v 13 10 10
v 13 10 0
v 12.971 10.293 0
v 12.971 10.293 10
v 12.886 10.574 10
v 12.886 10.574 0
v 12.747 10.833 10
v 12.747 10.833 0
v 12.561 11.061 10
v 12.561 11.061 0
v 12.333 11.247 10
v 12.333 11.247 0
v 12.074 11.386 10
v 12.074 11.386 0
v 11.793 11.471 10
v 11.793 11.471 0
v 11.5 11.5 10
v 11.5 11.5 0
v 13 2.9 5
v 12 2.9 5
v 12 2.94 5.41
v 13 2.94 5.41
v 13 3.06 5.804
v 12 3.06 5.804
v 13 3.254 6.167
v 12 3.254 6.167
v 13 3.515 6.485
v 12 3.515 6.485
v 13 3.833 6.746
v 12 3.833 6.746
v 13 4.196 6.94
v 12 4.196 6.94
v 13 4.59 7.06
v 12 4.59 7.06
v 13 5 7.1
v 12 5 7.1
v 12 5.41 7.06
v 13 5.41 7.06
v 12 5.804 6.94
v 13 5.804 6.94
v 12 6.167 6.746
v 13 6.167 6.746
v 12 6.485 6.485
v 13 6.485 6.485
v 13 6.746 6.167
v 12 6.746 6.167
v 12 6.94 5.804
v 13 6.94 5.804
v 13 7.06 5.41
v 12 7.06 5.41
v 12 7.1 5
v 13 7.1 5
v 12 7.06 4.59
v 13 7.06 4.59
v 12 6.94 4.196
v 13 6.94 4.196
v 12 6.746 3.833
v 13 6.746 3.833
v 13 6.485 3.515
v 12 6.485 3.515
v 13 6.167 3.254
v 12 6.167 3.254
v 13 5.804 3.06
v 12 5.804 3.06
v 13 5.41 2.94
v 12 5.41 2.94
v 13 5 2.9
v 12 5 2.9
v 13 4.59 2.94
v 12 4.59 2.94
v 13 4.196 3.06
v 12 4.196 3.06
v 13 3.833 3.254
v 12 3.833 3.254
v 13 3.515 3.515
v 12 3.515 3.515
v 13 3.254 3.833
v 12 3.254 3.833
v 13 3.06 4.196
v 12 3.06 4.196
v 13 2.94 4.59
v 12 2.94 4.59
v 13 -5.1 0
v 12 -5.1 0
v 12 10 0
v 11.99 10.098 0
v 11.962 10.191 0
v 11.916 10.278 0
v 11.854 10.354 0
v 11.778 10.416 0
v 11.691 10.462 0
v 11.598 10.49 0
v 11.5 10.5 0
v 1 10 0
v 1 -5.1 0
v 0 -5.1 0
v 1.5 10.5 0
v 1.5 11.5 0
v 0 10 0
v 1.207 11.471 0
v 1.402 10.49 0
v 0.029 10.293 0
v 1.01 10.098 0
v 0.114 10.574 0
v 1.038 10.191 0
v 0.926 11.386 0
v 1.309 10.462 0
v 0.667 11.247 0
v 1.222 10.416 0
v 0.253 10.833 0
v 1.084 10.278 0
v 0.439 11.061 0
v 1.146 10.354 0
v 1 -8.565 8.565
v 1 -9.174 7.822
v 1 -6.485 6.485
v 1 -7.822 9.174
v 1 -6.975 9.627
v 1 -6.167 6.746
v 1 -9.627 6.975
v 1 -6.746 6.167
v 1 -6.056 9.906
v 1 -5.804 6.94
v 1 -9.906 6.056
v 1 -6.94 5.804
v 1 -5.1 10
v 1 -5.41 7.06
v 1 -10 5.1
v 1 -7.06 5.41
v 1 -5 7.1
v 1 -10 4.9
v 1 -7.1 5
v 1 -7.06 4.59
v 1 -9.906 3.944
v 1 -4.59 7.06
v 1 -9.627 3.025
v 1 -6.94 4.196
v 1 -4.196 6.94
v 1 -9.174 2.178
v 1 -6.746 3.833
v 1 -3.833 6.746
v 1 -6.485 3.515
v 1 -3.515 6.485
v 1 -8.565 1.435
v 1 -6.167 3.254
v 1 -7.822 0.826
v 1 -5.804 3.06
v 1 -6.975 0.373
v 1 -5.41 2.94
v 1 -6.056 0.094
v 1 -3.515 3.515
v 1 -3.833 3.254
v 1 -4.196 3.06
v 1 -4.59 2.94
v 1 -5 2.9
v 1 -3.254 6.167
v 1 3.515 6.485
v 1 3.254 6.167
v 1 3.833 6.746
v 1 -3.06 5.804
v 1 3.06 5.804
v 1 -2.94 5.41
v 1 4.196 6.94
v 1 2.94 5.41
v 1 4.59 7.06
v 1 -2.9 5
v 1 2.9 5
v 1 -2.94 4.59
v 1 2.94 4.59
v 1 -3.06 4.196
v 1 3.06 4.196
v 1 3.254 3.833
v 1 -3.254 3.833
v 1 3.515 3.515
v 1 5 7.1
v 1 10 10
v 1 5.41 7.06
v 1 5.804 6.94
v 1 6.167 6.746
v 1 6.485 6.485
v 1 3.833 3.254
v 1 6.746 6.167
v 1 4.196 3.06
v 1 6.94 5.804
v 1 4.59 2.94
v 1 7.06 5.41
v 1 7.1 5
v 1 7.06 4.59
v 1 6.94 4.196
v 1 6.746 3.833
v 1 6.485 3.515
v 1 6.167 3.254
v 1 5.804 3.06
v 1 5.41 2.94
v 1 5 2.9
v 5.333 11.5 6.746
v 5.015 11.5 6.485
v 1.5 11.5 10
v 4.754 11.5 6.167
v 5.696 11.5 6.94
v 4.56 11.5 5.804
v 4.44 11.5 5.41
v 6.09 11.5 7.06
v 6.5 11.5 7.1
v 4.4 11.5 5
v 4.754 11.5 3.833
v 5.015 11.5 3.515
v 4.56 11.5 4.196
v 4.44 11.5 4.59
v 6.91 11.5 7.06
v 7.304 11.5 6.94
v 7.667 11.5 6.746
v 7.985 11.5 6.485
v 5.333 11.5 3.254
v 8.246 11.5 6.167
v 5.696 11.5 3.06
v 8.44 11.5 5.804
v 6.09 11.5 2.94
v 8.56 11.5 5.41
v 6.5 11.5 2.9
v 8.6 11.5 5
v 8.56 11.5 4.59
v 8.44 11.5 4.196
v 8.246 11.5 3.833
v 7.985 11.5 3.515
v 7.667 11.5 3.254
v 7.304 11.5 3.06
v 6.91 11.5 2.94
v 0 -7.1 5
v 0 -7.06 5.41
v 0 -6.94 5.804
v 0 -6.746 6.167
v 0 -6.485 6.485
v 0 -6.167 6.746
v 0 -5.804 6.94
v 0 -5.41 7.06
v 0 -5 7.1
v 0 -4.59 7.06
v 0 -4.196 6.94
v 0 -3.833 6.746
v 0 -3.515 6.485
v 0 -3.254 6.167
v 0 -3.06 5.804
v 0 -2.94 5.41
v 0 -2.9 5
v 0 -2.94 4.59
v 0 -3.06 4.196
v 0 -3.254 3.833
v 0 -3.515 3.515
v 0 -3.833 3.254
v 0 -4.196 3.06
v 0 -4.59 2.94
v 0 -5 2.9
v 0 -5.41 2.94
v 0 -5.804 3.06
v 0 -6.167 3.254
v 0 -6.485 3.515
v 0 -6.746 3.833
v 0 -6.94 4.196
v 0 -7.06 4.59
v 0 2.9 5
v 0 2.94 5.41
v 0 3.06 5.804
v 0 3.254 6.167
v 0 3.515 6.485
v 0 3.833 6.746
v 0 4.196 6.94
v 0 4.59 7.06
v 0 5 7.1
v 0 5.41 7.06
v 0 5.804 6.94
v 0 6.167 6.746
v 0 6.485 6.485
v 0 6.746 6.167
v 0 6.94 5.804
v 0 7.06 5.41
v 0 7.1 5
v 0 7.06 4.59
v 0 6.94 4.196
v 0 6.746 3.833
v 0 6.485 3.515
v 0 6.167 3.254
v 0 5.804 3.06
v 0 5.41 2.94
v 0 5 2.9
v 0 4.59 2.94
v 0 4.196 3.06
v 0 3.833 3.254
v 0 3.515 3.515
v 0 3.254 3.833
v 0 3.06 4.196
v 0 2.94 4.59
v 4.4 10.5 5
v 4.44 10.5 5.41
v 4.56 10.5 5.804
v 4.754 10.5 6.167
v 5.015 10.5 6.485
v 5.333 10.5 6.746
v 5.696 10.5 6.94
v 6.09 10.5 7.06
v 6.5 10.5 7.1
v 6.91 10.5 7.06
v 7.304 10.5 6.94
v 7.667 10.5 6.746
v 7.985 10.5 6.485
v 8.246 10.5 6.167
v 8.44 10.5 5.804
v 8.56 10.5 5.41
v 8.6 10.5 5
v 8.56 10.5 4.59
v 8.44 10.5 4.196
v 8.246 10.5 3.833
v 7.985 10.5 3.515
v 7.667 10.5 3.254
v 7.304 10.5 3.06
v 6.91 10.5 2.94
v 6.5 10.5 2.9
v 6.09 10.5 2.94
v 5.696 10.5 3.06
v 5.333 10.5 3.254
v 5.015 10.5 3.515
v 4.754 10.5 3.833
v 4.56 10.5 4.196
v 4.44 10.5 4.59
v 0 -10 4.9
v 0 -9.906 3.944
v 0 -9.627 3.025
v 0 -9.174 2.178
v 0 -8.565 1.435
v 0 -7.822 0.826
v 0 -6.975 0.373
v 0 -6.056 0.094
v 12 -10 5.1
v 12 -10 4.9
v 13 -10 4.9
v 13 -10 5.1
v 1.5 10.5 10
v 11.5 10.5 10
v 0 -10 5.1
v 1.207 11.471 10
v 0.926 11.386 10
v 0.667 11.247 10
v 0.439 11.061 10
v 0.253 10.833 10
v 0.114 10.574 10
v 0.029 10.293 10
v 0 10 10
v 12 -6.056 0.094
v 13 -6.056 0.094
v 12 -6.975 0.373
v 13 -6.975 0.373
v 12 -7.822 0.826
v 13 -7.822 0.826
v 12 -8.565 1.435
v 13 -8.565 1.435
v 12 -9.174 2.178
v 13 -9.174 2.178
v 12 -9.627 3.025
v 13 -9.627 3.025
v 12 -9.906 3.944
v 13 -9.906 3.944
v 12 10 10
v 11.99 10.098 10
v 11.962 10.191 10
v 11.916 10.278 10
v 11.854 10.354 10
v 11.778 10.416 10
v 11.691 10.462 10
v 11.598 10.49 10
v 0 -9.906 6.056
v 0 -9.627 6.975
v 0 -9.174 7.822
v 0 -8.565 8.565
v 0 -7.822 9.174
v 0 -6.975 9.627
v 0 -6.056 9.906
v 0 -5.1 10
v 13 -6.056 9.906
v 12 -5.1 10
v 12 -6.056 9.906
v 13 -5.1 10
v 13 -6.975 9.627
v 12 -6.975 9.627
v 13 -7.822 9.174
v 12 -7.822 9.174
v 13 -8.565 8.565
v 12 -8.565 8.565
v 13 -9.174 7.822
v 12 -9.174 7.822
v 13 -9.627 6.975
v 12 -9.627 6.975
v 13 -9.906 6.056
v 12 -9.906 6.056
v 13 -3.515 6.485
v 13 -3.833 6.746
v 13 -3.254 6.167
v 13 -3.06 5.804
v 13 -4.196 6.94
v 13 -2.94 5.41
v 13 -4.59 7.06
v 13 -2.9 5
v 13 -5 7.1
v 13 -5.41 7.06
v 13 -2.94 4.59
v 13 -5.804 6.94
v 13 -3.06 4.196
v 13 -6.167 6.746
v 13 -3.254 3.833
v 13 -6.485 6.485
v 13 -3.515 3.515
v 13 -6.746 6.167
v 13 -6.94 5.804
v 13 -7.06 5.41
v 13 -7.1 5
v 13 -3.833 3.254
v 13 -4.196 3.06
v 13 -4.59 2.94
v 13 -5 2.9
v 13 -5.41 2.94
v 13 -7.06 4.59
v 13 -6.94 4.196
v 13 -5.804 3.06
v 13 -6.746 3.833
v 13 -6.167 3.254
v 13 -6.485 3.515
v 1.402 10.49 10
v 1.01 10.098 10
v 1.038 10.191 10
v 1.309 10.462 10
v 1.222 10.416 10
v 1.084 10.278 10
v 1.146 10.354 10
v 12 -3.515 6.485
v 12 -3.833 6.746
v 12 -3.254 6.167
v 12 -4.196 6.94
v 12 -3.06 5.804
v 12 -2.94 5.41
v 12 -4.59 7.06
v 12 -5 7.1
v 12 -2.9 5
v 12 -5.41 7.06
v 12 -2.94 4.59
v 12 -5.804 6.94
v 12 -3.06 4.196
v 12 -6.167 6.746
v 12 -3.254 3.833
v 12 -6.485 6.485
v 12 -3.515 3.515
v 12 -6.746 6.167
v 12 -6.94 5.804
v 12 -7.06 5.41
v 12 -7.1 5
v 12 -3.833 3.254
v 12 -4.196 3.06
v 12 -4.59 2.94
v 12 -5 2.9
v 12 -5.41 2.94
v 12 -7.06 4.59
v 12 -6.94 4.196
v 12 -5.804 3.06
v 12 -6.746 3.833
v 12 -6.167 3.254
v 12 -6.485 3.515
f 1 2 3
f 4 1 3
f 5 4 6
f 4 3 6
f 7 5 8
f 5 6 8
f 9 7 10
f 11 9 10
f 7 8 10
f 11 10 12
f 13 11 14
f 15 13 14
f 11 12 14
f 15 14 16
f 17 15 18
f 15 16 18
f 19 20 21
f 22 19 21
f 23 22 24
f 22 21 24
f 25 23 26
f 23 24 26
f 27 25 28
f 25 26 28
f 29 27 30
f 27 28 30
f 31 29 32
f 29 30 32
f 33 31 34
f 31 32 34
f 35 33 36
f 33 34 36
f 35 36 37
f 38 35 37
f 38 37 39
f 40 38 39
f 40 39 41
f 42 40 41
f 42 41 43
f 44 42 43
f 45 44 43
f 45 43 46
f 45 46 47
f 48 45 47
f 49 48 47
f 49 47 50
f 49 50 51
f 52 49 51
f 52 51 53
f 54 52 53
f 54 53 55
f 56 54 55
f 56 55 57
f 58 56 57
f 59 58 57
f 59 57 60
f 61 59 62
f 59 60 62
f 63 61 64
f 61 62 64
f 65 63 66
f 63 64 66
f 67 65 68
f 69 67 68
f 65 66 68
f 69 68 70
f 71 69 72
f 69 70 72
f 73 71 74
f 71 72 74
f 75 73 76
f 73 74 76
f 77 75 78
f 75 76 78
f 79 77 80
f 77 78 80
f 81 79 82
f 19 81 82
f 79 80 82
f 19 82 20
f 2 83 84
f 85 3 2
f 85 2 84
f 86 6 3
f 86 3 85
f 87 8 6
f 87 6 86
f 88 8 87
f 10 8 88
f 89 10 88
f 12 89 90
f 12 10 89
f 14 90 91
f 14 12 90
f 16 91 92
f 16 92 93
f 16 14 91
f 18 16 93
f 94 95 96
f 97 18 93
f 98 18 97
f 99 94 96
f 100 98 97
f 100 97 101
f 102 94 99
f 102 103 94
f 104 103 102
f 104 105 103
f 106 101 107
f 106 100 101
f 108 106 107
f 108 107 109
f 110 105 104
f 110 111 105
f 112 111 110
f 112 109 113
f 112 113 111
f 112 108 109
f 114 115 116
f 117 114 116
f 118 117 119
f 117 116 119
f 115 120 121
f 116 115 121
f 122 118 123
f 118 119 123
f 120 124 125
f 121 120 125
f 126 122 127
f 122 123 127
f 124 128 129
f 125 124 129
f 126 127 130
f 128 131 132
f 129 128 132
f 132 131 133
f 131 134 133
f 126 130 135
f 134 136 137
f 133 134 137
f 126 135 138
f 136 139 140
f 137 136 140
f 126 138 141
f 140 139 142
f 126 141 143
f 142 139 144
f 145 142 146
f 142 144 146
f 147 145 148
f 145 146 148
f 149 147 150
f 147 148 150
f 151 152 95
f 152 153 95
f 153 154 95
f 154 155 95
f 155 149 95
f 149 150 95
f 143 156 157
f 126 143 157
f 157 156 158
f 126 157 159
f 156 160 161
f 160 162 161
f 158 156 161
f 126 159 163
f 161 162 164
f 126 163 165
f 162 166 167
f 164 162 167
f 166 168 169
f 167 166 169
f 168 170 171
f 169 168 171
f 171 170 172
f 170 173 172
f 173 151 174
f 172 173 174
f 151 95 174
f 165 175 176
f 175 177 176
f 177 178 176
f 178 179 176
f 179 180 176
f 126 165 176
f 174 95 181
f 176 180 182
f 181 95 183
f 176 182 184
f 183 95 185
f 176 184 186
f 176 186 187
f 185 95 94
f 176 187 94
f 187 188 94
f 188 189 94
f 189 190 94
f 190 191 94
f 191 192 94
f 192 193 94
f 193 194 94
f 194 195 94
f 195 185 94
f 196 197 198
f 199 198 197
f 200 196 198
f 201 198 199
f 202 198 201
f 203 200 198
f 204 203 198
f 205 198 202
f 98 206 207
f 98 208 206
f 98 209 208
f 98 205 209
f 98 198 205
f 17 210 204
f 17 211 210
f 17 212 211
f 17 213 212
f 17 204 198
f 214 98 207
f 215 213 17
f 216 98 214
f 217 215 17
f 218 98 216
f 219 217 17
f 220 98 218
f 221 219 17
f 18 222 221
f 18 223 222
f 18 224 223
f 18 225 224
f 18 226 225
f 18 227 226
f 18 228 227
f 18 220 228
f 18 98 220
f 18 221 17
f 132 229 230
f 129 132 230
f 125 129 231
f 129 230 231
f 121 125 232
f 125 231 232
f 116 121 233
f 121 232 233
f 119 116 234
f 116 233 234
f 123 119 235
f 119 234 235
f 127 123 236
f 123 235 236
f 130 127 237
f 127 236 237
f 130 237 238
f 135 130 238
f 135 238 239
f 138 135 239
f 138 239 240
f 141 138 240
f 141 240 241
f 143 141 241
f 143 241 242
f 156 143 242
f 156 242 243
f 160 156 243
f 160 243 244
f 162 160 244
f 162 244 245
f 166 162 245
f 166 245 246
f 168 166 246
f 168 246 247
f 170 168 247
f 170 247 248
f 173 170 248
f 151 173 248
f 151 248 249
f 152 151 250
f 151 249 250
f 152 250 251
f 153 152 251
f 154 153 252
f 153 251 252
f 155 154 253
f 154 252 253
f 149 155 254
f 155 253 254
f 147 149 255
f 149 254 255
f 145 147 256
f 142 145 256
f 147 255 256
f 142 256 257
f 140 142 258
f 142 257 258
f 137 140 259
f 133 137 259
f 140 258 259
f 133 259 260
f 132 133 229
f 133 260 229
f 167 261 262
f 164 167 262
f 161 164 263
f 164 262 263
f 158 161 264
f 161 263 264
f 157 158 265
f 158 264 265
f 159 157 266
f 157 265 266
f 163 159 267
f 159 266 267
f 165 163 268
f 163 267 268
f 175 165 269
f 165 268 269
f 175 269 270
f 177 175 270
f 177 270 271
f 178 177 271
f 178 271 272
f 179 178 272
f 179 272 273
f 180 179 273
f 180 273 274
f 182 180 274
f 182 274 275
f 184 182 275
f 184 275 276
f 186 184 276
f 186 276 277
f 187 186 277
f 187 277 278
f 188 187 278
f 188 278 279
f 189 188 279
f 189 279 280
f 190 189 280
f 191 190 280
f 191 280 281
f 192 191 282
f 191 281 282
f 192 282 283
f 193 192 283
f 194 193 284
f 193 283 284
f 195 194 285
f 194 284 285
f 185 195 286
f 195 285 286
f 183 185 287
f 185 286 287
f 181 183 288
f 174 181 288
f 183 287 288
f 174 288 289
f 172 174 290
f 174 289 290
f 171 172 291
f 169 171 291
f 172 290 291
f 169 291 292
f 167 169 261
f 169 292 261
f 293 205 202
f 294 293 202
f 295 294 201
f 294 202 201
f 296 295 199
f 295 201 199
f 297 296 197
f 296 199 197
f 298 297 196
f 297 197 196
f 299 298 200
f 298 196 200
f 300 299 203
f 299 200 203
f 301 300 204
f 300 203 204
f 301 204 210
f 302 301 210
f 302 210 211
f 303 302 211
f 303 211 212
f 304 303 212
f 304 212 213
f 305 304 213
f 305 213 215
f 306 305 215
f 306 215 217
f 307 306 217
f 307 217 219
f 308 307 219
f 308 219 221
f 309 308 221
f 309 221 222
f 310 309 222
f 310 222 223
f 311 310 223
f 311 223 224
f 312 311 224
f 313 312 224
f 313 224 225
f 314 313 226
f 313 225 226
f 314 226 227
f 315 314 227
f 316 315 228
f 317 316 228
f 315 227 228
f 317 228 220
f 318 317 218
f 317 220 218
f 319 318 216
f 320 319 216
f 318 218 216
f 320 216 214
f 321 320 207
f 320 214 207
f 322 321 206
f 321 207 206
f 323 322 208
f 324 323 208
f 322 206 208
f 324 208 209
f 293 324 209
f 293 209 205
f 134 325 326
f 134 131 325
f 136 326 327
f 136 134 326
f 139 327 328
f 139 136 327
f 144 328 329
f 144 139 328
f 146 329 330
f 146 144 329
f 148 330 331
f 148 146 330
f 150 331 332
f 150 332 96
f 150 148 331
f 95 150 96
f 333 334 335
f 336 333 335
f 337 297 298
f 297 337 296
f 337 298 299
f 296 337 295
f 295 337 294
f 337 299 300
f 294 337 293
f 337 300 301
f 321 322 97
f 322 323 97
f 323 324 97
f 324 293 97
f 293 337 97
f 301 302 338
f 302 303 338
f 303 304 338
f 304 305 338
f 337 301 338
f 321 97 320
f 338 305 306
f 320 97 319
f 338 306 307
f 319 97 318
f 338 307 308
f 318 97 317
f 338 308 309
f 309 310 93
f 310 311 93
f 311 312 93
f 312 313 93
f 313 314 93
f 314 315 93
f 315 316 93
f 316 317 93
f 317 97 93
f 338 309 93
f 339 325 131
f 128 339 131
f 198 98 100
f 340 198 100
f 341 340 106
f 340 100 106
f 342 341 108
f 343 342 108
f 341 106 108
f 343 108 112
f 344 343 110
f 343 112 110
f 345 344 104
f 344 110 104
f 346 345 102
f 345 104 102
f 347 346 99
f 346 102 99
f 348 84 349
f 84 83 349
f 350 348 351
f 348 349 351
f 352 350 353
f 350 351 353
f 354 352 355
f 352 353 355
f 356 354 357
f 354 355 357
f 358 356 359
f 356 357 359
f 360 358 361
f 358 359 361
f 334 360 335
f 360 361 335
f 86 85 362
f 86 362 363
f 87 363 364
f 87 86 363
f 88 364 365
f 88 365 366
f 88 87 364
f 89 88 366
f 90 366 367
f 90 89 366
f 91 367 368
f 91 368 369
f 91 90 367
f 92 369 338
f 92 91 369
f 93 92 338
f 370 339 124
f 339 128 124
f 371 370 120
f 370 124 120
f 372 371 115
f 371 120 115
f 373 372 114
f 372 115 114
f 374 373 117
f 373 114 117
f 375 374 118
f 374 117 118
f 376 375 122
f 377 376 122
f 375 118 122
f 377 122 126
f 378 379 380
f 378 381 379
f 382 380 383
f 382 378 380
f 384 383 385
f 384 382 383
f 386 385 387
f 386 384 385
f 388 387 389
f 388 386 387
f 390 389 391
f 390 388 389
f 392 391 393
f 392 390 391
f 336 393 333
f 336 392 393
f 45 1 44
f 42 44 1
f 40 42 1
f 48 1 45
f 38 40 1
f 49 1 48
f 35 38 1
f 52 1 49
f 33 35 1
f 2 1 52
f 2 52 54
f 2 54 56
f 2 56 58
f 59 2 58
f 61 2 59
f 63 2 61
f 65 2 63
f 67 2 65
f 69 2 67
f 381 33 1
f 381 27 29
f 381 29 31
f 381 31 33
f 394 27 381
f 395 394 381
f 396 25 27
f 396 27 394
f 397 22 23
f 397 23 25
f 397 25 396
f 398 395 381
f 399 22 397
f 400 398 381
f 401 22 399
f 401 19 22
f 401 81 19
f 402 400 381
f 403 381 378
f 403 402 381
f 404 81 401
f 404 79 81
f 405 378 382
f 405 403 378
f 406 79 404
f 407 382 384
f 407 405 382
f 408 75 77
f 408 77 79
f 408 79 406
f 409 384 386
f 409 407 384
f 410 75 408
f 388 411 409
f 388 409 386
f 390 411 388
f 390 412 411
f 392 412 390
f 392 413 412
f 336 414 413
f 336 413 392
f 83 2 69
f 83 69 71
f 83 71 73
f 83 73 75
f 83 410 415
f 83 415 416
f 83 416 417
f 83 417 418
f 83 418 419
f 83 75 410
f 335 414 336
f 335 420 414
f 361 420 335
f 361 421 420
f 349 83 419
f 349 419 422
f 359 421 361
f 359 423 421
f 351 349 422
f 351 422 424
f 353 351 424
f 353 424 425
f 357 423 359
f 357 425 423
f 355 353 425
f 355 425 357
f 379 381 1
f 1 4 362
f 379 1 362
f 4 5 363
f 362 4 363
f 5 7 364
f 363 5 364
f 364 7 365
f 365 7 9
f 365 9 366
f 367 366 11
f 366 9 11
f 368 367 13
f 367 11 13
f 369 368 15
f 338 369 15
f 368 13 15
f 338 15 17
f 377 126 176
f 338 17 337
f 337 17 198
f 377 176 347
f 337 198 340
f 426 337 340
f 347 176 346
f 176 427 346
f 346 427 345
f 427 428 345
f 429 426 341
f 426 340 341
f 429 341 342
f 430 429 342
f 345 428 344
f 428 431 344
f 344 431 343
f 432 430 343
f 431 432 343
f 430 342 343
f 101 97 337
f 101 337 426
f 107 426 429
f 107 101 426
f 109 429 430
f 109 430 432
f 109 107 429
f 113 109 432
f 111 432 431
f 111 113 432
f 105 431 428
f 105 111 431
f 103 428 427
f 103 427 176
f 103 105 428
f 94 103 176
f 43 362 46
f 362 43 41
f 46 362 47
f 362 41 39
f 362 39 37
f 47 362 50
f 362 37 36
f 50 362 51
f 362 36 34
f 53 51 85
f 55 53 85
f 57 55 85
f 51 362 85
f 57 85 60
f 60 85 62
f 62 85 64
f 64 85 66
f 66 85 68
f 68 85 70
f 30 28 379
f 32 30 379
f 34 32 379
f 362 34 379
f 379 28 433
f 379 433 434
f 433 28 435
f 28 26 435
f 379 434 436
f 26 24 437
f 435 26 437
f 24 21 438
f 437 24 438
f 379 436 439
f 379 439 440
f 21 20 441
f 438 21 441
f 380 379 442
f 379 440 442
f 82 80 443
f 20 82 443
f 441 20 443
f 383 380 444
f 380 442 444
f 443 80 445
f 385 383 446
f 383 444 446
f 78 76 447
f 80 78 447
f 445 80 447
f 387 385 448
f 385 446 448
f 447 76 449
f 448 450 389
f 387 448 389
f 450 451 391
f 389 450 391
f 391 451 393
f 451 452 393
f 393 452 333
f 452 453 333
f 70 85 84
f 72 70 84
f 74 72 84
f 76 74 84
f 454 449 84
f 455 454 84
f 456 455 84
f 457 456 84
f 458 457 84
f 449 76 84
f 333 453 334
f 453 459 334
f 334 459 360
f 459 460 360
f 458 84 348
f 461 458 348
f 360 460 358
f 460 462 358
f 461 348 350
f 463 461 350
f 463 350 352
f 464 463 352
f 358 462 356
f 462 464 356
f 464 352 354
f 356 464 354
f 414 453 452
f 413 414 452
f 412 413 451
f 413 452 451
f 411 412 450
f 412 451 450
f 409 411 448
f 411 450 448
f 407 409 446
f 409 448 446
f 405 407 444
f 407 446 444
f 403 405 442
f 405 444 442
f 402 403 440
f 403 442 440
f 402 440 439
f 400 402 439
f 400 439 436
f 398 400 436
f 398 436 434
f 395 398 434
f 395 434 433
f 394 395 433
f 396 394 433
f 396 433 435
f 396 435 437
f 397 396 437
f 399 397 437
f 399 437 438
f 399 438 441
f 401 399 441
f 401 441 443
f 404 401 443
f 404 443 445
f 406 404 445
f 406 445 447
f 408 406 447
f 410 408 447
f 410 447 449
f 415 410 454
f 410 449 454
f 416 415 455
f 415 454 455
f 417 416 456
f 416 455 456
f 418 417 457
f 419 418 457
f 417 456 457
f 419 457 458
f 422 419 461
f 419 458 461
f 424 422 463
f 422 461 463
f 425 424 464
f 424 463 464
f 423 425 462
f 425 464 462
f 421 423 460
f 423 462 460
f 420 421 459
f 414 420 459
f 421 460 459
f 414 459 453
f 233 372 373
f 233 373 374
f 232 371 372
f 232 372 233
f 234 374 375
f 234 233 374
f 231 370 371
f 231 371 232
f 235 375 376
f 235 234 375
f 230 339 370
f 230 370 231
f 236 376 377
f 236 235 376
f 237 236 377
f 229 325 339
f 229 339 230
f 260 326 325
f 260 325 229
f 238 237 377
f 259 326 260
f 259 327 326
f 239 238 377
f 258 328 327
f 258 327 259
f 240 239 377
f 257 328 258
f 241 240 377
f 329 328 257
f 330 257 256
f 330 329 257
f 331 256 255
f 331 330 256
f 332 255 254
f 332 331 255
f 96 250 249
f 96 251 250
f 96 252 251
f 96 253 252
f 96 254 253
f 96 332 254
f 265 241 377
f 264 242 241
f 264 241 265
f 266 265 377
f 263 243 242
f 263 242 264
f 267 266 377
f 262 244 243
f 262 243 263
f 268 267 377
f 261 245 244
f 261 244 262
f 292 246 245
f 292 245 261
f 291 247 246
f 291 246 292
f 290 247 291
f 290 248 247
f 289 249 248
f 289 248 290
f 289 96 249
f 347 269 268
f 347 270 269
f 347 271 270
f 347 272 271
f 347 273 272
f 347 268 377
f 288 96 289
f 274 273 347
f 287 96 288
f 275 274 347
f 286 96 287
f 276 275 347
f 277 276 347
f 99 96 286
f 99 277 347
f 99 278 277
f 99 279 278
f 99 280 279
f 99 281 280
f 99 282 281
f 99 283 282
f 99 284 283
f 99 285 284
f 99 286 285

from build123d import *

# Parameters (mm, degrees)
PAD_DEPTH       = 10
SKETCH002_R     = 2.1
POCKET_DEPTH    = 5
SKETCH001_R     = 2.1
POCKET001_DEPTH = 13.001
FILLET_R        = 4.9


with BuildPart() as part:
    # Sketch → Pad (new body)
    with BuildSketch(Plane.XY):
        with BuildLine():
            Line((0, -10), (0, 10))
            ThreePointArc((1.5, 11.5), (0.43934, 11.06066), (0, 10))
            Line((1.5, 11.5), (11.5, 11.5))
            ThreePointArc((13, 10), (12.56066, 11.06066), (11.5, 11.5))
            Line((13, 10), (13, -9.999991))
            Line((12, -9.999991), (13, -9.999991))
            Line((12, 10.000009), (12, -9.999991))
            ThreePointArc((12, 10.000009), (11.85355, 10.353556), (11.500001, 10.5))
            Line((1.5, 10.5), (11.500001, 10.5))
            ThreePointArc((1.5, 10.5), (1.146447, 10.353553), (1, 10))
            Line((1, -10), (1, 10))
            Line((0, -10), (1, -10))
        make_face()
    extrude(amount=PAD_DEPTH)

    # Sketch002 → Pocket (cut)
    with BuildSketch(Plane(origin=(0, 11.5, 0), x_dir=(-1, 0, 0), z_dir=(0, 1, 0))):
        with Locations((-6.5, 5)):
            Circle(SKETCH002_R)
    extrude(amount=-POCKET_DEPTH, mode=Mode.SUBTRACT)

    # Sketch001 → Pocket001 (cut, through all)
    with BuildSketch(Plane(origin=(0, 0, 0), x_dir=(0, -1, 0), z_dir=(-1, 0, 0))):
        with Locations((-5, 5)):
            Circle(SKETCH001_R)
        with Locations((5, 5)):
            Circle(SKETCH001_R)
    extrude(amount=-POCKET001_DEPTH, mode=Mode.SUBTRACT)

    # Fillet
    fillet_edges = [part.edges().sort_by_distance(p)[0] for p in [
        (0.5, -10, 10),
        (12.5, -9.999991, 10),
        (12.5, -9.999991, 0),
        (0.5, -10, 0),
    ]]
    fillet(fillet_edges, radius=FILLET_R)


solid = part.part
